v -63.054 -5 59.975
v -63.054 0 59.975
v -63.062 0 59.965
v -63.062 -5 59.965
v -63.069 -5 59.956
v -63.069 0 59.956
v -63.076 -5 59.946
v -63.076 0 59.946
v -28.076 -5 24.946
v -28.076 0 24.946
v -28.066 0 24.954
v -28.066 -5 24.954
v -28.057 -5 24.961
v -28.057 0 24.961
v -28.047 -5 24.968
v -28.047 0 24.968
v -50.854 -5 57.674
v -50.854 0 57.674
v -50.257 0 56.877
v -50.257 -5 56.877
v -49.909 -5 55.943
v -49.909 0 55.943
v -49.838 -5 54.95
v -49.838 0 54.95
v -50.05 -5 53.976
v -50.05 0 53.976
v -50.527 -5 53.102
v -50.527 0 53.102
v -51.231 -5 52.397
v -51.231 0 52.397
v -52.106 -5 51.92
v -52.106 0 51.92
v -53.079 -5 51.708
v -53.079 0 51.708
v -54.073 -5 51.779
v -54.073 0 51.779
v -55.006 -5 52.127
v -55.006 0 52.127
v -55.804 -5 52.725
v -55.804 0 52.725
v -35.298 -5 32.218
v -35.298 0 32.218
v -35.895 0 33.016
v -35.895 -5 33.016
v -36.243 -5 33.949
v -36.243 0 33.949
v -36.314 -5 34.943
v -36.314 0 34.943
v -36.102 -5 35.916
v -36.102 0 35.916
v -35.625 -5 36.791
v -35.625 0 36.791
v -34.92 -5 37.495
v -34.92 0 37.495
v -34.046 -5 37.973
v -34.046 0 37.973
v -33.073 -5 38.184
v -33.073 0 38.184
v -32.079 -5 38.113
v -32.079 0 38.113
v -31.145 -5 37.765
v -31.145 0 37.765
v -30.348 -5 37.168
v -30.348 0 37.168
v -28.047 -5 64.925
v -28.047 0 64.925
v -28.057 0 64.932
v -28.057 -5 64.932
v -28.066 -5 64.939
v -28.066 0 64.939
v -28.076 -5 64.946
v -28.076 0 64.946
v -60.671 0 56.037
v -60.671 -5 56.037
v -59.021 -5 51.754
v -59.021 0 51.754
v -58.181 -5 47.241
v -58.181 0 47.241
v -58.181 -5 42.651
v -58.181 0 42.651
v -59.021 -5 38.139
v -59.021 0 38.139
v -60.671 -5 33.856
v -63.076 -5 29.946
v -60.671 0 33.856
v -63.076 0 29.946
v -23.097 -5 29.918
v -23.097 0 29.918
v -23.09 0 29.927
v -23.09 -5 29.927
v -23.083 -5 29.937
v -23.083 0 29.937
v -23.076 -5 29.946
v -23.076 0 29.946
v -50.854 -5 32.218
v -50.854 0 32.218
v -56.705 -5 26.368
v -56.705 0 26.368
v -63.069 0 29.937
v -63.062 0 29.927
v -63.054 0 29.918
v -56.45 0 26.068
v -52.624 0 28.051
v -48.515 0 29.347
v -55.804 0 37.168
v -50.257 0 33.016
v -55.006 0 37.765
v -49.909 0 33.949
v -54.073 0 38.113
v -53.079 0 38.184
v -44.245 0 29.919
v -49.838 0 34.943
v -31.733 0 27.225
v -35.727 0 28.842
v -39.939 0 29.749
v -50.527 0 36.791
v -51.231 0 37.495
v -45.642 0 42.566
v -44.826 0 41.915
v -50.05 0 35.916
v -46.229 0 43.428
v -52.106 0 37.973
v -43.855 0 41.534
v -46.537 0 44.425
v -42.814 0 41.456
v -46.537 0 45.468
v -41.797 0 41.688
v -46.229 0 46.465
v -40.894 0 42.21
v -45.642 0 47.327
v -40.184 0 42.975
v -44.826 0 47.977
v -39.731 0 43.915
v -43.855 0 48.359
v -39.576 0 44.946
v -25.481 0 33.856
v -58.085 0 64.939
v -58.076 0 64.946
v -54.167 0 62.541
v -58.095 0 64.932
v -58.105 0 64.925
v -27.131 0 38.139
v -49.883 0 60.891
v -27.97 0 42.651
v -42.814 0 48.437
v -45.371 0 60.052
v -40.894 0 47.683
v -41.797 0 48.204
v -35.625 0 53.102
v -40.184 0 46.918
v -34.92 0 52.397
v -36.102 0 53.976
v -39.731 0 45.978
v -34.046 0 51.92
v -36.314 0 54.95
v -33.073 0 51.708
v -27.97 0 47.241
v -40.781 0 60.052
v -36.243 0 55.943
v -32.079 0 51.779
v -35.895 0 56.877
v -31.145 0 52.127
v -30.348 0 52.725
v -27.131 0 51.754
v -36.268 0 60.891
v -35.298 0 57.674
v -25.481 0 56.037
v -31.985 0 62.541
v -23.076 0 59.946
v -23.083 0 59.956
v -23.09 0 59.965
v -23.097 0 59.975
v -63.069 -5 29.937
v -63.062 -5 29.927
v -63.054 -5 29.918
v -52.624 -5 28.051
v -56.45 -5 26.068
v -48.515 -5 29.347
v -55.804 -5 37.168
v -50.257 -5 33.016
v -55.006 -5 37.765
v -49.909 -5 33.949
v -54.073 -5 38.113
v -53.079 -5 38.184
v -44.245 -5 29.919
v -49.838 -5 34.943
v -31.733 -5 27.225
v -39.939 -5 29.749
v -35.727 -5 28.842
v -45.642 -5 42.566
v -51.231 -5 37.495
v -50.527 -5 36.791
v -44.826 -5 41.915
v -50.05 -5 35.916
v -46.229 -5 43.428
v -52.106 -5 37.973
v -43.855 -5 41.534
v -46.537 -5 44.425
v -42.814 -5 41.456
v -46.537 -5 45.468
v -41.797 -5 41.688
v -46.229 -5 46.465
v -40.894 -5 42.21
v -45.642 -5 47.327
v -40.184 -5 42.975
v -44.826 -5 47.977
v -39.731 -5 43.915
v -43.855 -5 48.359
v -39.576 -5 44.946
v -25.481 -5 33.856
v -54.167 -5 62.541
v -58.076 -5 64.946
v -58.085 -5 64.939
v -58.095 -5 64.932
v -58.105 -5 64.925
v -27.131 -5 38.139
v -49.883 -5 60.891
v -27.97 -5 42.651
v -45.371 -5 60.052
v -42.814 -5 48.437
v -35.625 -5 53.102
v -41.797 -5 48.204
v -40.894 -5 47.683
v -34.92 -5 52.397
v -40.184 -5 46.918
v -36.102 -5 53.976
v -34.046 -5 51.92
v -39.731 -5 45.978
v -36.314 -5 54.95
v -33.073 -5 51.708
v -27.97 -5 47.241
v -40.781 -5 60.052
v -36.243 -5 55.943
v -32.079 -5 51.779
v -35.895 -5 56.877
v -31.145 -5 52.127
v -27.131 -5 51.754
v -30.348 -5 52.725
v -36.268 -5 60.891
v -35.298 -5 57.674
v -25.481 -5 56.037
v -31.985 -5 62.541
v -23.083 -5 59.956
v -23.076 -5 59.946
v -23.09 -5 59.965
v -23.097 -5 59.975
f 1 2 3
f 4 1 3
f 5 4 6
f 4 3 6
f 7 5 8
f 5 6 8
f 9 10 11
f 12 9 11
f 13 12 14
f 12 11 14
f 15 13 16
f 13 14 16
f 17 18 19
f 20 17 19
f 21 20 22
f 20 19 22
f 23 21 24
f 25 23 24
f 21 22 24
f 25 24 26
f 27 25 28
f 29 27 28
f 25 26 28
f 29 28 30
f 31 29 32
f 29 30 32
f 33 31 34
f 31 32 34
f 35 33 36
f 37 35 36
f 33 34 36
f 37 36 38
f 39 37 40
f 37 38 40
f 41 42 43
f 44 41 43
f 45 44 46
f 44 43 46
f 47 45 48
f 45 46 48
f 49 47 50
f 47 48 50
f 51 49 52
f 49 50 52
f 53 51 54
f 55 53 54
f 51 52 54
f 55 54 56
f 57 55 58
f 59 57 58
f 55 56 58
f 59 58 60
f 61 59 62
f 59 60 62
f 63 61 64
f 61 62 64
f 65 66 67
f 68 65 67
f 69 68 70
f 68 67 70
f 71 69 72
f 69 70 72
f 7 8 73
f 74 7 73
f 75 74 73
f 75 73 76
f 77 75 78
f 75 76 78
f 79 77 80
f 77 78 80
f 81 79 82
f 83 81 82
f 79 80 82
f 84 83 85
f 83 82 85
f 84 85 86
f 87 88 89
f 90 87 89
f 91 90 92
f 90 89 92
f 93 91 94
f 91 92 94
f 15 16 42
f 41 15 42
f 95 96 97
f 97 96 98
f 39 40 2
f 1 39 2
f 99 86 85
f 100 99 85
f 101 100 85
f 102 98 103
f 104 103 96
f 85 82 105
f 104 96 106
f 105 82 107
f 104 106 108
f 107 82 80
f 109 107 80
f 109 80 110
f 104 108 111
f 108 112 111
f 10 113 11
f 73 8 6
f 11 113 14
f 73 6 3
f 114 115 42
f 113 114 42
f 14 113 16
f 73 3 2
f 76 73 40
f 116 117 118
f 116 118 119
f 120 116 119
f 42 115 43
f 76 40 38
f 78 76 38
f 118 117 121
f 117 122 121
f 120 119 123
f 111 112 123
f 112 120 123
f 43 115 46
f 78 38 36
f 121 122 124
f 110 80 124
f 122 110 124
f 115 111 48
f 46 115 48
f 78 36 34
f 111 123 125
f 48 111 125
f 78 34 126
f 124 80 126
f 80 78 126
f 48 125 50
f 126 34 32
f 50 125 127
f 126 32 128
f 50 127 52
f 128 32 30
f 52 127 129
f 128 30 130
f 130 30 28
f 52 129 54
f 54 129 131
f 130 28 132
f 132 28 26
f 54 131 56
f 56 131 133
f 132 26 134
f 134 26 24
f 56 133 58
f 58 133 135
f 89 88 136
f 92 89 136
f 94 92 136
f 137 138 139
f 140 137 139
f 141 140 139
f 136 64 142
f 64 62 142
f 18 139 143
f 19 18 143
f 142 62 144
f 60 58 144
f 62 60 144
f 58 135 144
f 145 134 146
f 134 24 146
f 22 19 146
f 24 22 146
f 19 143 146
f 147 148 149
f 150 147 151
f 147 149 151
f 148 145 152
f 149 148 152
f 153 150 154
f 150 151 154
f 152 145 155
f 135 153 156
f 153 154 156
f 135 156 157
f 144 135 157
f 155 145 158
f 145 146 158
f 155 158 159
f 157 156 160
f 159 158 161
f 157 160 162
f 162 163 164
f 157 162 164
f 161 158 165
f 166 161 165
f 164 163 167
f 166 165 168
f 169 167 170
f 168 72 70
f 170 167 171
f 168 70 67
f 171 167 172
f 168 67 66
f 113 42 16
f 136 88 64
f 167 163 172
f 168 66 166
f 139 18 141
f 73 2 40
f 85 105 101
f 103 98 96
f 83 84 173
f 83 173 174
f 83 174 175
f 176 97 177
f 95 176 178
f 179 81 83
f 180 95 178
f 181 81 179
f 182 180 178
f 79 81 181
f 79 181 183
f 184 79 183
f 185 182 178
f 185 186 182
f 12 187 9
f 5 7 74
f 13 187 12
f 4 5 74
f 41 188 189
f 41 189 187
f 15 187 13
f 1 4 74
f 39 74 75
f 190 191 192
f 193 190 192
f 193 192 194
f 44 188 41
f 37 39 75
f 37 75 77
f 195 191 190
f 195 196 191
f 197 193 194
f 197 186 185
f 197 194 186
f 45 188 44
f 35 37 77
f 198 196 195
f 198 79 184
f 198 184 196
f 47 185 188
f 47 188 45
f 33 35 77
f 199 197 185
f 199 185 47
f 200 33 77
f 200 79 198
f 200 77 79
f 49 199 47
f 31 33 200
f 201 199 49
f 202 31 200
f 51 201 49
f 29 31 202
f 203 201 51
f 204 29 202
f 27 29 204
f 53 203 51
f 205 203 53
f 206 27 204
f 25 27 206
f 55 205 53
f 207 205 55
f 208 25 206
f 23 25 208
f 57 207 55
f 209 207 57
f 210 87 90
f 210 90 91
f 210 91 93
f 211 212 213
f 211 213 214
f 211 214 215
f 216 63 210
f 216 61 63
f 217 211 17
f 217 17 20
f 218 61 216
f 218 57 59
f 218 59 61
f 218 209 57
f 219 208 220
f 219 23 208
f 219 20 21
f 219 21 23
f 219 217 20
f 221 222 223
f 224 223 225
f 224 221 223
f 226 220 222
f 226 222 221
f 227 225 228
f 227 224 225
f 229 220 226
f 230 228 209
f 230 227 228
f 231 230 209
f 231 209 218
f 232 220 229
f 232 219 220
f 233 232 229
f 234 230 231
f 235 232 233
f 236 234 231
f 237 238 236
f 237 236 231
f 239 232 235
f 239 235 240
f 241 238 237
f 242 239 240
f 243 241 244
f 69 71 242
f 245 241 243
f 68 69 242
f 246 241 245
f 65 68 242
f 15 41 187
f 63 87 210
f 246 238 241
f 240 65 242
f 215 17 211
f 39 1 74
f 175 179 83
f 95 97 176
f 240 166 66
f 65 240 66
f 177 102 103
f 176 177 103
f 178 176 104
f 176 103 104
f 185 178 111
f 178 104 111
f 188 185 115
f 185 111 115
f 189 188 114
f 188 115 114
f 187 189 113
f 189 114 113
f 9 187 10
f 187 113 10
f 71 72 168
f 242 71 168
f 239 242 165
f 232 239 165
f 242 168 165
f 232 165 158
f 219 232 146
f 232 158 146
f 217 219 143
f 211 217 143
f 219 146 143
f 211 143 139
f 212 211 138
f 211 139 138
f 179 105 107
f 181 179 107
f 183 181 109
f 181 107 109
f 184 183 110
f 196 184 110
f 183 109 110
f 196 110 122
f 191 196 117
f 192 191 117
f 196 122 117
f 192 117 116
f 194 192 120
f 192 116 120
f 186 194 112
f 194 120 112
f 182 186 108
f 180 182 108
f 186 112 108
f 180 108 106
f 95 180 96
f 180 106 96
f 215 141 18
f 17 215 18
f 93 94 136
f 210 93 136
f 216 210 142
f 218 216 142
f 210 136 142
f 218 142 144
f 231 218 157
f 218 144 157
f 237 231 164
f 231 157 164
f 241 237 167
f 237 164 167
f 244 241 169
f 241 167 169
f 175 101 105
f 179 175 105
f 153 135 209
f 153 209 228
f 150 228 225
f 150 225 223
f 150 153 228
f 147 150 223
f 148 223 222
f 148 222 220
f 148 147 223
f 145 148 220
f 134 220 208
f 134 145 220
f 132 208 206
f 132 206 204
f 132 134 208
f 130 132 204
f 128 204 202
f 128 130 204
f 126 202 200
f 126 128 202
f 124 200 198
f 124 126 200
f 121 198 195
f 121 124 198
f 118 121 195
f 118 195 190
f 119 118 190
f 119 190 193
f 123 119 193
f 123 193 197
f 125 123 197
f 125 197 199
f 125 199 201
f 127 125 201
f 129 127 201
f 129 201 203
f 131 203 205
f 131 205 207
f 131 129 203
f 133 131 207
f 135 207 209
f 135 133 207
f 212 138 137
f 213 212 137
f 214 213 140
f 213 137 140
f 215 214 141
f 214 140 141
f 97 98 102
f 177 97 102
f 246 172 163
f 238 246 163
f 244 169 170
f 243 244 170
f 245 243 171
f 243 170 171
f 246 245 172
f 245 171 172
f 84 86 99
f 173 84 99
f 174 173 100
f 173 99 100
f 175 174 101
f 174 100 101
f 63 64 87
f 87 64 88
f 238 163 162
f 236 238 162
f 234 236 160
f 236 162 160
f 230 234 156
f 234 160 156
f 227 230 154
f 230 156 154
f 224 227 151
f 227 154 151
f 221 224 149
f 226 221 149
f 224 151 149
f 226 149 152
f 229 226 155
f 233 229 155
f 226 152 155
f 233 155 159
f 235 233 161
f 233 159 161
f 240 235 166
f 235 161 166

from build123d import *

# Parameters (mm, degrees)
F0_R     = 3.5
F1_DEPTH = 5


with BuildPart() as f1:
    # F0 (on Front) → F1 (new body)
    with BuildSketch(Plane.XZ):
        with BuildLine():
            ThreePointArc((-56.449953, 26.068207), (-42.088166, 29.926809), (-28.075866, 24.946327))
            ThreePointArc((-28.075866, 24.946327), (-28.061514, 24.9571), (-28.047169, 24.967882))
            Line((-28.047169, 24.967882), (-35.297692, 32.218405))
            Line((-35.297692, 32.218405), (-43.075866, 39.99658))
            Line((-43.075866, 39.99658), (-50.854041, 32.218405))
            Line((-50.854041, 32.218405), (-56.704745, 26.367701))
            Line((-56.704745, 26.367701), (-56.449953, 26.068207))
        make_face()
        with BuildLine():
            Line((-43.075866, 39.99658), (-35.297692, 32.218405))
            ThreePointArc((-35.297692, 32.218405), (-35.297692, 37.168153), (-30.347944, 37.168153))
            Line((-30.347944, 37.168153), (-38.126119, 44.946327))
            Line((-38.126119, 44.946327), (-30.347944, 52.724502))
            ThreePointArc((-30.347944, 52.724502), (-35.297692, 52.724502), (-35.297692, 57.674249))
            Line((-35.297692, 57.674249), (-43.075866, 49.896075))
            Line((-43.075866, 49.896075), (-50.854041, 57.674249))
            ThreePointArc((-50.854041, 57.674249), (-50.854041, 52.724502), (-55.803788, 52.724502))
            Line((-55.803788, 52.724502), (-48.025614, 44.946327))
            Line((-48.025614, 44.946327), (-55.803788, 37.168153))
            ThreePointArc((-55.803788, 37.168153), (-50.854041, 37.168153), (-50.854041, 32.218405))
            Line((-50.854041, 32.218405), (-43.075866, 39.99658))
        make_face()
        with Locations((-43.075866, 44.946327)):
            Circle(F0_R, mode=Mode.SUBTRACT)
        with BuildLine():
            Line((-30.347944, 37.168153), (-23.097422, 29.91763))
            ThreePointArc((-23.097422, 29.91763), (-23.086639, 29.931975), (-23.075866, 29.946327))
            ThreePointArc((-23.075866, 29.946327), (-28.075866, 44.946327), (-23.075866, 59.946327))
            ThreePointArc((-23.075866, 59.946327), (-23.086639, 59.96068), (-23.097422, 59.975025))
            Line((-23.097422, 59.975025), (-30.347944, 52.724502))
            Line((-30.347944, 52.724502), (-38.126119, 44.946327))
            Line((-38.126119, 44.946327), (-30.347944, 37.168153))
        make_face()
        with BuildLine():
            Line((-63.054311, 29.91763), (-55.803788, 37.168153))
            Line((-55.803788, 37.168153), (-48.025614, 44.946327))
            Line((-48.025614, 44.946327), (-55.803788, 52.724502))
            Line((-55.803788, 52.724502), (-63.054311, 59.975025))
            ThreePointArc((-63.054311, 59.975025), (-63.065094, 59.96068), (-63.075866, 59.946327))
            ThreePointArc((-63.075866, 59.946327), (-58.075866, 44.946327), (-63.075866, 29.946327))
            ThreePointArc((-63.075866, 29.946327), (-63.065094, 29.931975), (-63.054311, 29.91763))
        make_face()
        with BuildLine():
            Line((-43.075866, 49.896075), (-35.297692, 57.674249))
            Line((-35.297692, 57.674249), (-28.047169, 64.924772))
            ThreePointArc((-28.047169, 64.924772), (-28.061514, 64.935555), (-28.075866, 64.946327))
            ThreePointArc((-28.075866, 64.946327), (-43.075866, 59.946327), (-58.075866, 64.946327))
            ThreePointArc((-58.075866, 64.946327), (-58.090219, 64.935555), (-58.104564, 64.924772))
            Line((-58.104564, 64.924772), (-50.854041, 57.674249))
            Line((-50.854041, 57.674249), (-43.075866, 49.896075))
        make_face()
    extrude(amount=F1_DEPTH)


solid = f1.part
